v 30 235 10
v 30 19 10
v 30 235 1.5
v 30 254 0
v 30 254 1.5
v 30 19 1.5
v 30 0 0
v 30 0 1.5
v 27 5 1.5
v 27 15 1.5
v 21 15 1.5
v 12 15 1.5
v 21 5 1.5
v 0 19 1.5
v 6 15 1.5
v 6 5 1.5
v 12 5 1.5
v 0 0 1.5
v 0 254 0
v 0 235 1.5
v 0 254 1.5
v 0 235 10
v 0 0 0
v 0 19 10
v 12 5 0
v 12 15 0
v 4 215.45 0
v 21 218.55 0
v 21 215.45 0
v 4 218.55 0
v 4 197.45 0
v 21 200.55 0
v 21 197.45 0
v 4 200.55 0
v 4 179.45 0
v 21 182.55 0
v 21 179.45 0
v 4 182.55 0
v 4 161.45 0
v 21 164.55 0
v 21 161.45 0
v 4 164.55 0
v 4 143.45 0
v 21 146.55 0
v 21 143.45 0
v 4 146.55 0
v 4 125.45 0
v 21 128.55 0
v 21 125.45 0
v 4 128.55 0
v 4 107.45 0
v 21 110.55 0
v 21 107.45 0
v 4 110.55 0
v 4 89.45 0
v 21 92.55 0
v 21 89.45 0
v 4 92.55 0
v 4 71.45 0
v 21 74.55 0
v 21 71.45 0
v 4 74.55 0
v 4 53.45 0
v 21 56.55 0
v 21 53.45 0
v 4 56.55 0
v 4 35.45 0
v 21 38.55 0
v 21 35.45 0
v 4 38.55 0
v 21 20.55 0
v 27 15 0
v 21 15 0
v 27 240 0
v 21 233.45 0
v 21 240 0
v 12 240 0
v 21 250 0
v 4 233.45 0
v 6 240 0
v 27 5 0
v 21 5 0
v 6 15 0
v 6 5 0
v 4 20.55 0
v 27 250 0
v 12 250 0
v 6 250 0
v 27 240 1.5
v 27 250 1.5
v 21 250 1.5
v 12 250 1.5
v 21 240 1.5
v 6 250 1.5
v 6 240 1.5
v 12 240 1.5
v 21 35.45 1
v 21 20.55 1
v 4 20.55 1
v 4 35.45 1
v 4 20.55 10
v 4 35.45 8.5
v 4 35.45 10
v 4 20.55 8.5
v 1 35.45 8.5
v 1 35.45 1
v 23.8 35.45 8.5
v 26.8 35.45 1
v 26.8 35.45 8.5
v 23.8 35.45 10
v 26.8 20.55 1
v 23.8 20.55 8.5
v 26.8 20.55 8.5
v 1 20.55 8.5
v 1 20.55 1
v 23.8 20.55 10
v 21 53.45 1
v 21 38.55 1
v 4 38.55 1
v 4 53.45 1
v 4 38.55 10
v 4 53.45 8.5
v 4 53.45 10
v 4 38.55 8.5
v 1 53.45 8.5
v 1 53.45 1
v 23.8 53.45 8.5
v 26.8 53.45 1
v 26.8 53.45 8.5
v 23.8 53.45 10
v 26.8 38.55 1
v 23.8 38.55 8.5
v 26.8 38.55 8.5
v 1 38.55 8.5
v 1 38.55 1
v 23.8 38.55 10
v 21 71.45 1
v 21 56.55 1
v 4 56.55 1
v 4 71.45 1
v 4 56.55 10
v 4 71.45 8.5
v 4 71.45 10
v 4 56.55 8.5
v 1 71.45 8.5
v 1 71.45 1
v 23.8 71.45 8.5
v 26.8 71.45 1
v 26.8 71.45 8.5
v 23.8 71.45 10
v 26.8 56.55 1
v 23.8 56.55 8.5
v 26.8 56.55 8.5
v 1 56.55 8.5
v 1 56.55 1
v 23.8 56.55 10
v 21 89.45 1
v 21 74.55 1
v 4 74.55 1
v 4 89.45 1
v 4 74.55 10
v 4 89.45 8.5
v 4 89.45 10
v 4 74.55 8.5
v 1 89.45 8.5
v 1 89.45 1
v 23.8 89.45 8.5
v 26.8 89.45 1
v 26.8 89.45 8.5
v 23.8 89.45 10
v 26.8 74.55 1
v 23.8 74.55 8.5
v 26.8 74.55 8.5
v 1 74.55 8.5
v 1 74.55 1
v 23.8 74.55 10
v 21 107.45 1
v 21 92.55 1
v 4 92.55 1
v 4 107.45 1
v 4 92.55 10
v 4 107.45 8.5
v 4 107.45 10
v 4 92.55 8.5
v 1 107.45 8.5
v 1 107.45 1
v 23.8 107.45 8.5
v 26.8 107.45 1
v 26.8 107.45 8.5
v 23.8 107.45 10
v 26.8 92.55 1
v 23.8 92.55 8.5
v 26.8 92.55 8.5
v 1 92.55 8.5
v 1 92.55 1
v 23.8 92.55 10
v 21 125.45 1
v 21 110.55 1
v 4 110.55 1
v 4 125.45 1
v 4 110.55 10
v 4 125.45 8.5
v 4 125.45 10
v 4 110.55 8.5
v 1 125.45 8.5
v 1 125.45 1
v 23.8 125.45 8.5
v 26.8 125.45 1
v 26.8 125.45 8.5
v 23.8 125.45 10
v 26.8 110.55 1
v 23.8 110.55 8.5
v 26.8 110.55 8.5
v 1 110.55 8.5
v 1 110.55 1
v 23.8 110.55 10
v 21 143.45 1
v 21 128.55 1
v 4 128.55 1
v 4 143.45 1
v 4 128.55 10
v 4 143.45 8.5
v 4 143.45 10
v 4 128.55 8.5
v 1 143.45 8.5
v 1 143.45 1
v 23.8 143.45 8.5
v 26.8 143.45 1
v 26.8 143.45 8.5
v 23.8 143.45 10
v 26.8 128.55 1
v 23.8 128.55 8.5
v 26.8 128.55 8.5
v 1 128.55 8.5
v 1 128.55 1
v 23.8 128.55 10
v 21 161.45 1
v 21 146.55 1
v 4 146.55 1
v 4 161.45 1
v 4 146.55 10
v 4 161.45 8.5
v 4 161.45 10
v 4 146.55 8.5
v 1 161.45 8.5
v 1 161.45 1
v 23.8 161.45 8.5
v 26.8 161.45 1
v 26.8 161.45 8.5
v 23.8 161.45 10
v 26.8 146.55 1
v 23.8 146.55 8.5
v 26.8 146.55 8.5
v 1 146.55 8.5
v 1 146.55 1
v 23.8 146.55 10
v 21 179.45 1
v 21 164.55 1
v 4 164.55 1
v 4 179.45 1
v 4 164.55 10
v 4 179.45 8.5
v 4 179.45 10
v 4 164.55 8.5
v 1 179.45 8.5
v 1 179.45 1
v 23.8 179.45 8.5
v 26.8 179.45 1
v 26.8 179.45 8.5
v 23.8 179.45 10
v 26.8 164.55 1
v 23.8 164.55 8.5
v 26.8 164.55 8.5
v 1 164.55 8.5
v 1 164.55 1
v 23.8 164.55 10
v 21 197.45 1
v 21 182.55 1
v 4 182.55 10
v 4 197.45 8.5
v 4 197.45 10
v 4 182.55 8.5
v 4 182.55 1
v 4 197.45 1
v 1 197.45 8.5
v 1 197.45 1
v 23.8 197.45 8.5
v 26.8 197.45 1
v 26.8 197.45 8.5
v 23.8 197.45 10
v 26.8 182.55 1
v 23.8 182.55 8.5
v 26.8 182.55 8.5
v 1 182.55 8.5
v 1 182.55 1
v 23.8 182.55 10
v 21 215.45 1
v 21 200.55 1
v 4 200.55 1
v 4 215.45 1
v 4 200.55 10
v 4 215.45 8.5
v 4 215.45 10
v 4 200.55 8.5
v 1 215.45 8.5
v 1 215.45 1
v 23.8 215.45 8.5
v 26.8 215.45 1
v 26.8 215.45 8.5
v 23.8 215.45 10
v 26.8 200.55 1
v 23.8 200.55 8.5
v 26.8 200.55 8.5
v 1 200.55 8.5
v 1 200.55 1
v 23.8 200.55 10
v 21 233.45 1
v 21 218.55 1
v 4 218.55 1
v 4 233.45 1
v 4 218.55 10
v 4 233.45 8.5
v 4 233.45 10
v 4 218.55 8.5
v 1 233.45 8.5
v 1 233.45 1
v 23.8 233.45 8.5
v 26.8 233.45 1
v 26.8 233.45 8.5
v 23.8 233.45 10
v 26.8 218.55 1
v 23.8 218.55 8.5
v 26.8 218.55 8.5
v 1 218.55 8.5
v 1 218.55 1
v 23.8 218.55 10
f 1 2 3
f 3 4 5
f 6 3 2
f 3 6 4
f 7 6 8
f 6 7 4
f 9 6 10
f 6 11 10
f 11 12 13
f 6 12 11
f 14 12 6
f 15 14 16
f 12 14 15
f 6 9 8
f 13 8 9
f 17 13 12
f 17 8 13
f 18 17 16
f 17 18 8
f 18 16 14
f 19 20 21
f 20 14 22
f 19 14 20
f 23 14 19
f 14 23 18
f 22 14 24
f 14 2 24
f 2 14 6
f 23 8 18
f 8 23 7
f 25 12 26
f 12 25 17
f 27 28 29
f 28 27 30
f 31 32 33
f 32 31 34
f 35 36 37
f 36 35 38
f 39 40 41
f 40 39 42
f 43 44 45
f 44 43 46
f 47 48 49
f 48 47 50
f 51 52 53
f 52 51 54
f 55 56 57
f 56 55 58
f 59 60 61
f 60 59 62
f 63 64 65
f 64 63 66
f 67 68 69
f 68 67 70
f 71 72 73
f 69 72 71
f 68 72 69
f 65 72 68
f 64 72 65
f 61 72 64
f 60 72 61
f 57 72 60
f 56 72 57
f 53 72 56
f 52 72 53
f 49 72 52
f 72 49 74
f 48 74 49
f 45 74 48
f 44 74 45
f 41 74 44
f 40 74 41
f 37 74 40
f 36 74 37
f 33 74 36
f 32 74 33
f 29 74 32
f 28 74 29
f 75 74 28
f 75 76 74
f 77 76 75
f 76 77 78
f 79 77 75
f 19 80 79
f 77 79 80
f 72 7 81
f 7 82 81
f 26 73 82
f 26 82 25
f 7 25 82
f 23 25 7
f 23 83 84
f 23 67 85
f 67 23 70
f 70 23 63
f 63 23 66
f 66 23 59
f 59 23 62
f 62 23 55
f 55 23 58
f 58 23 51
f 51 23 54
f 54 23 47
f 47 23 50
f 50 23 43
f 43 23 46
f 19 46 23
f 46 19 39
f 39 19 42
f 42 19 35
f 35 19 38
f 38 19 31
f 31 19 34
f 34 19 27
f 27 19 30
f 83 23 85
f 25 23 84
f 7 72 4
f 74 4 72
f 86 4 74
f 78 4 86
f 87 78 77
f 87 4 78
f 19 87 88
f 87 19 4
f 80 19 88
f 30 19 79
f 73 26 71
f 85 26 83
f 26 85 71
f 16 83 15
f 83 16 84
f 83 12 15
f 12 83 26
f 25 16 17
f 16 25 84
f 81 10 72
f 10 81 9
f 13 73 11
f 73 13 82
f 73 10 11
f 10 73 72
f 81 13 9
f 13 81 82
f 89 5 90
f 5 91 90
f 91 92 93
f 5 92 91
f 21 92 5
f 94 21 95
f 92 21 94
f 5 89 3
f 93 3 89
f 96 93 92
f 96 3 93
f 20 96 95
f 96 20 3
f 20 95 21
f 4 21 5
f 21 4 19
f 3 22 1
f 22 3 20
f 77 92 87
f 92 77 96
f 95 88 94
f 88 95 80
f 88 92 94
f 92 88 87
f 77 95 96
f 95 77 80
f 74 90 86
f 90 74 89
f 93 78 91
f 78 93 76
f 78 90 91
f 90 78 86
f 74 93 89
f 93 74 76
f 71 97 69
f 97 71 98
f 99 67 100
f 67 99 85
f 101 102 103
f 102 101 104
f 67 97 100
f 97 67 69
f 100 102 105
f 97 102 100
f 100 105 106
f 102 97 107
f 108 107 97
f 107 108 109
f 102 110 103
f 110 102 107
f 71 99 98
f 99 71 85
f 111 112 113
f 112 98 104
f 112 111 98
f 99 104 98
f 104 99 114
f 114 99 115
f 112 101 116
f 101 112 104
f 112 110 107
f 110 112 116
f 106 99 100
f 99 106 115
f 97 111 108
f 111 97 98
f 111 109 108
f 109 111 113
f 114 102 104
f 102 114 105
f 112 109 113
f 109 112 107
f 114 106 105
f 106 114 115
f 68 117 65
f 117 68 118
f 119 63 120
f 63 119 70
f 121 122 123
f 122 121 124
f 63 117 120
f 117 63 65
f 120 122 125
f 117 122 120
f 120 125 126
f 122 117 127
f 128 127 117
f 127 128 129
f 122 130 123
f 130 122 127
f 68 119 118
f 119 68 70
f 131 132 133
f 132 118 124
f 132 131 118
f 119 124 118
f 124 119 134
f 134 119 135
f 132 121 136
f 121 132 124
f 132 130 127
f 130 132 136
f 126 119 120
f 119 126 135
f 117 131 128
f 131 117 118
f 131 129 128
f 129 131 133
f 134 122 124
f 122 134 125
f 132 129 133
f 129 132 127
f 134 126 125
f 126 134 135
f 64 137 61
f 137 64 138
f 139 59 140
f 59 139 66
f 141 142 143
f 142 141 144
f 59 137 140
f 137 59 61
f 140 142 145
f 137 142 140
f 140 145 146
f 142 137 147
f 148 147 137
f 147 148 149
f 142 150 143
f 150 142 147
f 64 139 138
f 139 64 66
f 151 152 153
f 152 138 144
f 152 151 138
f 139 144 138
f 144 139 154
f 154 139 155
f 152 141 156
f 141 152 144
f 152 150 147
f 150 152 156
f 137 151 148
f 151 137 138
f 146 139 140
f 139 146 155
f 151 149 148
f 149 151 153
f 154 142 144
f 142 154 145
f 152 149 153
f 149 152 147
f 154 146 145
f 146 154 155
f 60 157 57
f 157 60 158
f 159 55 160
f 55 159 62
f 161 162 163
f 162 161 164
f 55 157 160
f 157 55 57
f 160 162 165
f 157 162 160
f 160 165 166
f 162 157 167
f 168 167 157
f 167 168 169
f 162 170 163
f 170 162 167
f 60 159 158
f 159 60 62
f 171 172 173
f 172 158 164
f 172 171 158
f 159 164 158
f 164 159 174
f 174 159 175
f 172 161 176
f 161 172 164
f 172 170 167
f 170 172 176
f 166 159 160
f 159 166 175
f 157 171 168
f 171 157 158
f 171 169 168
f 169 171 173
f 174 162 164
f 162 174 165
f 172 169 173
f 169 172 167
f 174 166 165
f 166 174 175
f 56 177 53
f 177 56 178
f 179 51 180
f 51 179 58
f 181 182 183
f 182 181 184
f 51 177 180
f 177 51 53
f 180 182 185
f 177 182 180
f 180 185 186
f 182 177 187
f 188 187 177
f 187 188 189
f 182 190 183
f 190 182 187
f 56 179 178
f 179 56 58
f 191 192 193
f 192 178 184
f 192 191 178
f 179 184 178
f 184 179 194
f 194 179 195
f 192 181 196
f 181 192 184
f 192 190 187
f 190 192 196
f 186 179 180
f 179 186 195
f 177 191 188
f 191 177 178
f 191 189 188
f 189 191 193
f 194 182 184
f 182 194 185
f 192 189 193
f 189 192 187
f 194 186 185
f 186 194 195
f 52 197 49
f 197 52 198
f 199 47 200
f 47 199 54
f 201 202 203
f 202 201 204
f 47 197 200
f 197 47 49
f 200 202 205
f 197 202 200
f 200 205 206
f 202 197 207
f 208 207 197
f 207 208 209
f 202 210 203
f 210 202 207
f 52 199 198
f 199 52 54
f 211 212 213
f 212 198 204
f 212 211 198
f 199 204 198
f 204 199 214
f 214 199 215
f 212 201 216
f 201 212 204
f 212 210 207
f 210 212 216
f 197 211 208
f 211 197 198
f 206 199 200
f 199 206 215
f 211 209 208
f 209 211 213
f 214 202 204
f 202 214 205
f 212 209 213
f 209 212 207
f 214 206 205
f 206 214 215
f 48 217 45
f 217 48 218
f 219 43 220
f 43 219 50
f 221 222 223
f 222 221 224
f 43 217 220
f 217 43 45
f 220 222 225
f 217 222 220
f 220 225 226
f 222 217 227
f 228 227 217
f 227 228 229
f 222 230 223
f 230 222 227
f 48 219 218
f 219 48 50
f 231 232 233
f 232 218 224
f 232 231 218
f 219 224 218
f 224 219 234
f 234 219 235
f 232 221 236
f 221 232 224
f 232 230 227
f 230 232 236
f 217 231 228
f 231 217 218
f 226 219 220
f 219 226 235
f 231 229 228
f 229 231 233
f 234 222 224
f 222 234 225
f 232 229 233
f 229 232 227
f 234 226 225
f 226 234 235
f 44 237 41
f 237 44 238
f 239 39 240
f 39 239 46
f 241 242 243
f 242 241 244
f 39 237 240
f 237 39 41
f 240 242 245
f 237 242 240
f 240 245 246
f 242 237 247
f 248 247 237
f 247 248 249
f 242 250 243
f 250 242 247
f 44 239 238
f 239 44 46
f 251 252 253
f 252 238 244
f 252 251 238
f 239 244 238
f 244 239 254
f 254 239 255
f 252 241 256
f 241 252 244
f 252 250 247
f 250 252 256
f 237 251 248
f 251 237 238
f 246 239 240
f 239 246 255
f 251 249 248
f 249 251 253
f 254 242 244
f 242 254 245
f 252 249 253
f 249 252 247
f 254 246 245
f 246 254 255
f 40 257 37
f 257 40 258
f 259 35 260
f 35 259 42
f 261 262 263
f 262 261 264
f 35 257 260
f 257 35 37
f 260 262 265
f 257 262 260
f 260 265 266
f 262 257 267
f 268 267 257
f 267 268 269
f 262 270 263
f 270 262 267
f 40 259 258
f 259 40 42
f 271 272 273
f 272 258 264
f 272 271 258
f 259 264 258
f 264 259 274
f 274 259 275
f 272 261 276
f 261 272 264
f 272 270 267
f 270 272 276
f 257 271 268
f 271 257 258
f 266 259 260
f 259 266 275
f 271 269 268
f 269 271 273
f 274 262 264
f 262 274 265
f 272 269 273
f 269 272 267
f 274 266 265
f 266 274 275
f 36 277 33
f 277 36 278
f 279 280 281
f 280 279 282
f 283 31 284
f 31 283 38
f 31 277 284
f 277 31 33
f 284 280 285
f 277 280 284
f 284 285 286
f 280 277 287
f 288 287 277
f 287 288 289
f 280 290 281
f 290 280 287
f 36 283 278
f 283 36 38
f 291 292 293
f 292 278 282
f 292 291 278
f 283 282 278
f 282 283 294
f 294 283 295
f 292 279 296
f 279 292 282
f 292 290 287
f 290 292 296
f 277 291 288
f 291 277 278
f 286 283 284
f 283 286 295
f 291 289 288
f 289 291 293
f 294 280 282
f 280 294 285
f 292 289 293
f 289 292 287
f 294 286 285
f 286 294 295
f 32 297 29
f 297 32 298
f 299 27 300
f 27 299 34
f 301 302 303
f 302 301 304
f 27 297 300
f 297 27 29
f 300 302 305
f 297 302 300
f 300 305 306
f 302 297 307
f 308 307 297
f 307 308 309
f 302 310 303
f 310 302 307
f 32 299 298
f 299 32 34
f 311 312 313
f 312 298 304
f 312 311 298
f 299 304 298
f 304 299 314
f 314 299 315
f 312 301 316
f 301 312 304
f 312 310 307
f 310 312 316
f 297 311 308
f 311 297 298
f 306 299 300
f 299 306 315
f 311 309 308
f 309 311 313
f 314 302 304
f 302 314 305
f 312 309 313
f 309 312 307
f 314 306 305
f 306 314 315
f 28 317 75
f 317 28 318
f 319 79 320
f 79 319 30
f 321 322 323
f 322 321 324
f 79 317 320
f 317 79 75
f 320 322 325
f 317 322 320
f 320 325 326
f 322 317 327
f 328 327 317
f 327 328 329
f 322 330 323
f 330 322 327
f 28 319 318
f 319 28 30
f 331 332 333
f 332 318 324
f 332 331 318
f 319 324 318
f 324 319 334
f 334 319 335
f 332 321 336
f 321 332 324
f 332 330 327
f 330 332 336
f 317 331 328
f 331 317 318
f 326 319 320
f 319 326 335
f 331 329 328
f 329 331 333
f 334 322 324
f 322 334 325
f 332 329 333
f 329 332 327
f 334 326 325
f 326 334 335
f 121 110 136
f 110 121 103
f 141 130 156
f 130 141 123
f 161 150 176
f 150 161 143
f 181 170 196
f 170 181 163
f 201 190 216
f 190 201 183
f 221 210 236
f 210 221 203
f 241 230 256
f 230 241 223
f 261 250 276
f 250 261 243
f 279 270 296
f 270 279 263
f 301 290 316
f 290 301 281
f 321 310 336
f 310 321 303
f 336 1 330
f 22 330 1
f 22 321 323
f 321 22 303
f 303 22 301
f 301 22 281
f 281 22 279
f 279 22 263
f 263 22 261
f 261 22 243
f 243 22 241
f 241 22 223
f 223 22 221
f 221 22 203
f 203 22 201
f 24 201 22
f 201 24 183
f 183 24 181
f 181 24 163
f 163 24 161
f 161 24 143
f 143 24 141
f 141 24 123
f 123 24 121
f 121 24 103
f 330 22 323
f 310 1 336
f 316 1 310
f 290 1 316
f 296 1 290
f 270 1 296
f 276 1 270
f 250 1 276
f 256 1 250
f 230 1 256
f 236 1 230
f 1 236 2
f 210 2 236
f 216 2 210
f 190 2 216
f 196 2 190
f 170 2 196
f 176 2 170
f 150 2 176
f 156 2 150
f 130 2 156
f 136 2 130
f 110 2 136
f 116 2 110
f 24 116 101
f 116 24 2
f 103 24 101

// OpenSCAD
one_unit_width = 30;
// one_unit_width = 44.45; // standard size for one unit
one_unit_lenght = 254;
holder_width = 19;

keystone_width = 14.9;
keystone_length = 19.80;
keystone_x_position = 4;
keystone_wall_depth = 1.50;

depth = 10;

cable_holder_width = 40;

module_counts = 12;


module keystone_hole(length = keystone_length, width = keystone_width, depth = 20) {    
    cube([length, width, depth]);
}

module keystone_holes(padding_length = 3, start_with = holder_width) {
    keystone_gap = (
        (one_unit_lenght - holder_width* 2) - (keystone_width * module_counts )
    ) / module_counts;
        
    for (i = [0: module_counts-1]){              
        gap = keystone_gap * i; 
        
        padding_gap = keystone_gap / 2;
                
        keystone_y_position = start_with + gap + padding_gap + (i * keystone_width) ;
        
        // front hole
        translate([keystone_x_position , keystone_y_position, 0]) 
        keystone_hole(length = 17);
        
        // back hole
        translate([keystone_x_position, keystone_y_position, 1]) 
        keystone_hole(depth=20);
                           
        // middle space
        translate([keystone_x_position-3, keystone_y_position, 1]) 
        keystone_hole(depth = depth - keystone_wall_depth - 1 , length = keystone_length  + 6);        
    }
}

module holder(position = 0) {
   translate([0, position, keystone_wall_depth])
   cube([one_unit_width, holder_width, 10]);    
    
   translate([6, position + 5, 0]) 
   cube([6, 10, 20]);
    
   translate([21, position + 5, 0]) 
   cube([6, 10, 20]);
}

module patch_panel() {
  difference() {       
    cube([one_unit_width, one_unit_lenght, depth]);
         
    holder();
    holder(one_unit_lenght - holder_width);
    
    keystone_holes();        
   } // end differene
} // end module


patch_panel();
